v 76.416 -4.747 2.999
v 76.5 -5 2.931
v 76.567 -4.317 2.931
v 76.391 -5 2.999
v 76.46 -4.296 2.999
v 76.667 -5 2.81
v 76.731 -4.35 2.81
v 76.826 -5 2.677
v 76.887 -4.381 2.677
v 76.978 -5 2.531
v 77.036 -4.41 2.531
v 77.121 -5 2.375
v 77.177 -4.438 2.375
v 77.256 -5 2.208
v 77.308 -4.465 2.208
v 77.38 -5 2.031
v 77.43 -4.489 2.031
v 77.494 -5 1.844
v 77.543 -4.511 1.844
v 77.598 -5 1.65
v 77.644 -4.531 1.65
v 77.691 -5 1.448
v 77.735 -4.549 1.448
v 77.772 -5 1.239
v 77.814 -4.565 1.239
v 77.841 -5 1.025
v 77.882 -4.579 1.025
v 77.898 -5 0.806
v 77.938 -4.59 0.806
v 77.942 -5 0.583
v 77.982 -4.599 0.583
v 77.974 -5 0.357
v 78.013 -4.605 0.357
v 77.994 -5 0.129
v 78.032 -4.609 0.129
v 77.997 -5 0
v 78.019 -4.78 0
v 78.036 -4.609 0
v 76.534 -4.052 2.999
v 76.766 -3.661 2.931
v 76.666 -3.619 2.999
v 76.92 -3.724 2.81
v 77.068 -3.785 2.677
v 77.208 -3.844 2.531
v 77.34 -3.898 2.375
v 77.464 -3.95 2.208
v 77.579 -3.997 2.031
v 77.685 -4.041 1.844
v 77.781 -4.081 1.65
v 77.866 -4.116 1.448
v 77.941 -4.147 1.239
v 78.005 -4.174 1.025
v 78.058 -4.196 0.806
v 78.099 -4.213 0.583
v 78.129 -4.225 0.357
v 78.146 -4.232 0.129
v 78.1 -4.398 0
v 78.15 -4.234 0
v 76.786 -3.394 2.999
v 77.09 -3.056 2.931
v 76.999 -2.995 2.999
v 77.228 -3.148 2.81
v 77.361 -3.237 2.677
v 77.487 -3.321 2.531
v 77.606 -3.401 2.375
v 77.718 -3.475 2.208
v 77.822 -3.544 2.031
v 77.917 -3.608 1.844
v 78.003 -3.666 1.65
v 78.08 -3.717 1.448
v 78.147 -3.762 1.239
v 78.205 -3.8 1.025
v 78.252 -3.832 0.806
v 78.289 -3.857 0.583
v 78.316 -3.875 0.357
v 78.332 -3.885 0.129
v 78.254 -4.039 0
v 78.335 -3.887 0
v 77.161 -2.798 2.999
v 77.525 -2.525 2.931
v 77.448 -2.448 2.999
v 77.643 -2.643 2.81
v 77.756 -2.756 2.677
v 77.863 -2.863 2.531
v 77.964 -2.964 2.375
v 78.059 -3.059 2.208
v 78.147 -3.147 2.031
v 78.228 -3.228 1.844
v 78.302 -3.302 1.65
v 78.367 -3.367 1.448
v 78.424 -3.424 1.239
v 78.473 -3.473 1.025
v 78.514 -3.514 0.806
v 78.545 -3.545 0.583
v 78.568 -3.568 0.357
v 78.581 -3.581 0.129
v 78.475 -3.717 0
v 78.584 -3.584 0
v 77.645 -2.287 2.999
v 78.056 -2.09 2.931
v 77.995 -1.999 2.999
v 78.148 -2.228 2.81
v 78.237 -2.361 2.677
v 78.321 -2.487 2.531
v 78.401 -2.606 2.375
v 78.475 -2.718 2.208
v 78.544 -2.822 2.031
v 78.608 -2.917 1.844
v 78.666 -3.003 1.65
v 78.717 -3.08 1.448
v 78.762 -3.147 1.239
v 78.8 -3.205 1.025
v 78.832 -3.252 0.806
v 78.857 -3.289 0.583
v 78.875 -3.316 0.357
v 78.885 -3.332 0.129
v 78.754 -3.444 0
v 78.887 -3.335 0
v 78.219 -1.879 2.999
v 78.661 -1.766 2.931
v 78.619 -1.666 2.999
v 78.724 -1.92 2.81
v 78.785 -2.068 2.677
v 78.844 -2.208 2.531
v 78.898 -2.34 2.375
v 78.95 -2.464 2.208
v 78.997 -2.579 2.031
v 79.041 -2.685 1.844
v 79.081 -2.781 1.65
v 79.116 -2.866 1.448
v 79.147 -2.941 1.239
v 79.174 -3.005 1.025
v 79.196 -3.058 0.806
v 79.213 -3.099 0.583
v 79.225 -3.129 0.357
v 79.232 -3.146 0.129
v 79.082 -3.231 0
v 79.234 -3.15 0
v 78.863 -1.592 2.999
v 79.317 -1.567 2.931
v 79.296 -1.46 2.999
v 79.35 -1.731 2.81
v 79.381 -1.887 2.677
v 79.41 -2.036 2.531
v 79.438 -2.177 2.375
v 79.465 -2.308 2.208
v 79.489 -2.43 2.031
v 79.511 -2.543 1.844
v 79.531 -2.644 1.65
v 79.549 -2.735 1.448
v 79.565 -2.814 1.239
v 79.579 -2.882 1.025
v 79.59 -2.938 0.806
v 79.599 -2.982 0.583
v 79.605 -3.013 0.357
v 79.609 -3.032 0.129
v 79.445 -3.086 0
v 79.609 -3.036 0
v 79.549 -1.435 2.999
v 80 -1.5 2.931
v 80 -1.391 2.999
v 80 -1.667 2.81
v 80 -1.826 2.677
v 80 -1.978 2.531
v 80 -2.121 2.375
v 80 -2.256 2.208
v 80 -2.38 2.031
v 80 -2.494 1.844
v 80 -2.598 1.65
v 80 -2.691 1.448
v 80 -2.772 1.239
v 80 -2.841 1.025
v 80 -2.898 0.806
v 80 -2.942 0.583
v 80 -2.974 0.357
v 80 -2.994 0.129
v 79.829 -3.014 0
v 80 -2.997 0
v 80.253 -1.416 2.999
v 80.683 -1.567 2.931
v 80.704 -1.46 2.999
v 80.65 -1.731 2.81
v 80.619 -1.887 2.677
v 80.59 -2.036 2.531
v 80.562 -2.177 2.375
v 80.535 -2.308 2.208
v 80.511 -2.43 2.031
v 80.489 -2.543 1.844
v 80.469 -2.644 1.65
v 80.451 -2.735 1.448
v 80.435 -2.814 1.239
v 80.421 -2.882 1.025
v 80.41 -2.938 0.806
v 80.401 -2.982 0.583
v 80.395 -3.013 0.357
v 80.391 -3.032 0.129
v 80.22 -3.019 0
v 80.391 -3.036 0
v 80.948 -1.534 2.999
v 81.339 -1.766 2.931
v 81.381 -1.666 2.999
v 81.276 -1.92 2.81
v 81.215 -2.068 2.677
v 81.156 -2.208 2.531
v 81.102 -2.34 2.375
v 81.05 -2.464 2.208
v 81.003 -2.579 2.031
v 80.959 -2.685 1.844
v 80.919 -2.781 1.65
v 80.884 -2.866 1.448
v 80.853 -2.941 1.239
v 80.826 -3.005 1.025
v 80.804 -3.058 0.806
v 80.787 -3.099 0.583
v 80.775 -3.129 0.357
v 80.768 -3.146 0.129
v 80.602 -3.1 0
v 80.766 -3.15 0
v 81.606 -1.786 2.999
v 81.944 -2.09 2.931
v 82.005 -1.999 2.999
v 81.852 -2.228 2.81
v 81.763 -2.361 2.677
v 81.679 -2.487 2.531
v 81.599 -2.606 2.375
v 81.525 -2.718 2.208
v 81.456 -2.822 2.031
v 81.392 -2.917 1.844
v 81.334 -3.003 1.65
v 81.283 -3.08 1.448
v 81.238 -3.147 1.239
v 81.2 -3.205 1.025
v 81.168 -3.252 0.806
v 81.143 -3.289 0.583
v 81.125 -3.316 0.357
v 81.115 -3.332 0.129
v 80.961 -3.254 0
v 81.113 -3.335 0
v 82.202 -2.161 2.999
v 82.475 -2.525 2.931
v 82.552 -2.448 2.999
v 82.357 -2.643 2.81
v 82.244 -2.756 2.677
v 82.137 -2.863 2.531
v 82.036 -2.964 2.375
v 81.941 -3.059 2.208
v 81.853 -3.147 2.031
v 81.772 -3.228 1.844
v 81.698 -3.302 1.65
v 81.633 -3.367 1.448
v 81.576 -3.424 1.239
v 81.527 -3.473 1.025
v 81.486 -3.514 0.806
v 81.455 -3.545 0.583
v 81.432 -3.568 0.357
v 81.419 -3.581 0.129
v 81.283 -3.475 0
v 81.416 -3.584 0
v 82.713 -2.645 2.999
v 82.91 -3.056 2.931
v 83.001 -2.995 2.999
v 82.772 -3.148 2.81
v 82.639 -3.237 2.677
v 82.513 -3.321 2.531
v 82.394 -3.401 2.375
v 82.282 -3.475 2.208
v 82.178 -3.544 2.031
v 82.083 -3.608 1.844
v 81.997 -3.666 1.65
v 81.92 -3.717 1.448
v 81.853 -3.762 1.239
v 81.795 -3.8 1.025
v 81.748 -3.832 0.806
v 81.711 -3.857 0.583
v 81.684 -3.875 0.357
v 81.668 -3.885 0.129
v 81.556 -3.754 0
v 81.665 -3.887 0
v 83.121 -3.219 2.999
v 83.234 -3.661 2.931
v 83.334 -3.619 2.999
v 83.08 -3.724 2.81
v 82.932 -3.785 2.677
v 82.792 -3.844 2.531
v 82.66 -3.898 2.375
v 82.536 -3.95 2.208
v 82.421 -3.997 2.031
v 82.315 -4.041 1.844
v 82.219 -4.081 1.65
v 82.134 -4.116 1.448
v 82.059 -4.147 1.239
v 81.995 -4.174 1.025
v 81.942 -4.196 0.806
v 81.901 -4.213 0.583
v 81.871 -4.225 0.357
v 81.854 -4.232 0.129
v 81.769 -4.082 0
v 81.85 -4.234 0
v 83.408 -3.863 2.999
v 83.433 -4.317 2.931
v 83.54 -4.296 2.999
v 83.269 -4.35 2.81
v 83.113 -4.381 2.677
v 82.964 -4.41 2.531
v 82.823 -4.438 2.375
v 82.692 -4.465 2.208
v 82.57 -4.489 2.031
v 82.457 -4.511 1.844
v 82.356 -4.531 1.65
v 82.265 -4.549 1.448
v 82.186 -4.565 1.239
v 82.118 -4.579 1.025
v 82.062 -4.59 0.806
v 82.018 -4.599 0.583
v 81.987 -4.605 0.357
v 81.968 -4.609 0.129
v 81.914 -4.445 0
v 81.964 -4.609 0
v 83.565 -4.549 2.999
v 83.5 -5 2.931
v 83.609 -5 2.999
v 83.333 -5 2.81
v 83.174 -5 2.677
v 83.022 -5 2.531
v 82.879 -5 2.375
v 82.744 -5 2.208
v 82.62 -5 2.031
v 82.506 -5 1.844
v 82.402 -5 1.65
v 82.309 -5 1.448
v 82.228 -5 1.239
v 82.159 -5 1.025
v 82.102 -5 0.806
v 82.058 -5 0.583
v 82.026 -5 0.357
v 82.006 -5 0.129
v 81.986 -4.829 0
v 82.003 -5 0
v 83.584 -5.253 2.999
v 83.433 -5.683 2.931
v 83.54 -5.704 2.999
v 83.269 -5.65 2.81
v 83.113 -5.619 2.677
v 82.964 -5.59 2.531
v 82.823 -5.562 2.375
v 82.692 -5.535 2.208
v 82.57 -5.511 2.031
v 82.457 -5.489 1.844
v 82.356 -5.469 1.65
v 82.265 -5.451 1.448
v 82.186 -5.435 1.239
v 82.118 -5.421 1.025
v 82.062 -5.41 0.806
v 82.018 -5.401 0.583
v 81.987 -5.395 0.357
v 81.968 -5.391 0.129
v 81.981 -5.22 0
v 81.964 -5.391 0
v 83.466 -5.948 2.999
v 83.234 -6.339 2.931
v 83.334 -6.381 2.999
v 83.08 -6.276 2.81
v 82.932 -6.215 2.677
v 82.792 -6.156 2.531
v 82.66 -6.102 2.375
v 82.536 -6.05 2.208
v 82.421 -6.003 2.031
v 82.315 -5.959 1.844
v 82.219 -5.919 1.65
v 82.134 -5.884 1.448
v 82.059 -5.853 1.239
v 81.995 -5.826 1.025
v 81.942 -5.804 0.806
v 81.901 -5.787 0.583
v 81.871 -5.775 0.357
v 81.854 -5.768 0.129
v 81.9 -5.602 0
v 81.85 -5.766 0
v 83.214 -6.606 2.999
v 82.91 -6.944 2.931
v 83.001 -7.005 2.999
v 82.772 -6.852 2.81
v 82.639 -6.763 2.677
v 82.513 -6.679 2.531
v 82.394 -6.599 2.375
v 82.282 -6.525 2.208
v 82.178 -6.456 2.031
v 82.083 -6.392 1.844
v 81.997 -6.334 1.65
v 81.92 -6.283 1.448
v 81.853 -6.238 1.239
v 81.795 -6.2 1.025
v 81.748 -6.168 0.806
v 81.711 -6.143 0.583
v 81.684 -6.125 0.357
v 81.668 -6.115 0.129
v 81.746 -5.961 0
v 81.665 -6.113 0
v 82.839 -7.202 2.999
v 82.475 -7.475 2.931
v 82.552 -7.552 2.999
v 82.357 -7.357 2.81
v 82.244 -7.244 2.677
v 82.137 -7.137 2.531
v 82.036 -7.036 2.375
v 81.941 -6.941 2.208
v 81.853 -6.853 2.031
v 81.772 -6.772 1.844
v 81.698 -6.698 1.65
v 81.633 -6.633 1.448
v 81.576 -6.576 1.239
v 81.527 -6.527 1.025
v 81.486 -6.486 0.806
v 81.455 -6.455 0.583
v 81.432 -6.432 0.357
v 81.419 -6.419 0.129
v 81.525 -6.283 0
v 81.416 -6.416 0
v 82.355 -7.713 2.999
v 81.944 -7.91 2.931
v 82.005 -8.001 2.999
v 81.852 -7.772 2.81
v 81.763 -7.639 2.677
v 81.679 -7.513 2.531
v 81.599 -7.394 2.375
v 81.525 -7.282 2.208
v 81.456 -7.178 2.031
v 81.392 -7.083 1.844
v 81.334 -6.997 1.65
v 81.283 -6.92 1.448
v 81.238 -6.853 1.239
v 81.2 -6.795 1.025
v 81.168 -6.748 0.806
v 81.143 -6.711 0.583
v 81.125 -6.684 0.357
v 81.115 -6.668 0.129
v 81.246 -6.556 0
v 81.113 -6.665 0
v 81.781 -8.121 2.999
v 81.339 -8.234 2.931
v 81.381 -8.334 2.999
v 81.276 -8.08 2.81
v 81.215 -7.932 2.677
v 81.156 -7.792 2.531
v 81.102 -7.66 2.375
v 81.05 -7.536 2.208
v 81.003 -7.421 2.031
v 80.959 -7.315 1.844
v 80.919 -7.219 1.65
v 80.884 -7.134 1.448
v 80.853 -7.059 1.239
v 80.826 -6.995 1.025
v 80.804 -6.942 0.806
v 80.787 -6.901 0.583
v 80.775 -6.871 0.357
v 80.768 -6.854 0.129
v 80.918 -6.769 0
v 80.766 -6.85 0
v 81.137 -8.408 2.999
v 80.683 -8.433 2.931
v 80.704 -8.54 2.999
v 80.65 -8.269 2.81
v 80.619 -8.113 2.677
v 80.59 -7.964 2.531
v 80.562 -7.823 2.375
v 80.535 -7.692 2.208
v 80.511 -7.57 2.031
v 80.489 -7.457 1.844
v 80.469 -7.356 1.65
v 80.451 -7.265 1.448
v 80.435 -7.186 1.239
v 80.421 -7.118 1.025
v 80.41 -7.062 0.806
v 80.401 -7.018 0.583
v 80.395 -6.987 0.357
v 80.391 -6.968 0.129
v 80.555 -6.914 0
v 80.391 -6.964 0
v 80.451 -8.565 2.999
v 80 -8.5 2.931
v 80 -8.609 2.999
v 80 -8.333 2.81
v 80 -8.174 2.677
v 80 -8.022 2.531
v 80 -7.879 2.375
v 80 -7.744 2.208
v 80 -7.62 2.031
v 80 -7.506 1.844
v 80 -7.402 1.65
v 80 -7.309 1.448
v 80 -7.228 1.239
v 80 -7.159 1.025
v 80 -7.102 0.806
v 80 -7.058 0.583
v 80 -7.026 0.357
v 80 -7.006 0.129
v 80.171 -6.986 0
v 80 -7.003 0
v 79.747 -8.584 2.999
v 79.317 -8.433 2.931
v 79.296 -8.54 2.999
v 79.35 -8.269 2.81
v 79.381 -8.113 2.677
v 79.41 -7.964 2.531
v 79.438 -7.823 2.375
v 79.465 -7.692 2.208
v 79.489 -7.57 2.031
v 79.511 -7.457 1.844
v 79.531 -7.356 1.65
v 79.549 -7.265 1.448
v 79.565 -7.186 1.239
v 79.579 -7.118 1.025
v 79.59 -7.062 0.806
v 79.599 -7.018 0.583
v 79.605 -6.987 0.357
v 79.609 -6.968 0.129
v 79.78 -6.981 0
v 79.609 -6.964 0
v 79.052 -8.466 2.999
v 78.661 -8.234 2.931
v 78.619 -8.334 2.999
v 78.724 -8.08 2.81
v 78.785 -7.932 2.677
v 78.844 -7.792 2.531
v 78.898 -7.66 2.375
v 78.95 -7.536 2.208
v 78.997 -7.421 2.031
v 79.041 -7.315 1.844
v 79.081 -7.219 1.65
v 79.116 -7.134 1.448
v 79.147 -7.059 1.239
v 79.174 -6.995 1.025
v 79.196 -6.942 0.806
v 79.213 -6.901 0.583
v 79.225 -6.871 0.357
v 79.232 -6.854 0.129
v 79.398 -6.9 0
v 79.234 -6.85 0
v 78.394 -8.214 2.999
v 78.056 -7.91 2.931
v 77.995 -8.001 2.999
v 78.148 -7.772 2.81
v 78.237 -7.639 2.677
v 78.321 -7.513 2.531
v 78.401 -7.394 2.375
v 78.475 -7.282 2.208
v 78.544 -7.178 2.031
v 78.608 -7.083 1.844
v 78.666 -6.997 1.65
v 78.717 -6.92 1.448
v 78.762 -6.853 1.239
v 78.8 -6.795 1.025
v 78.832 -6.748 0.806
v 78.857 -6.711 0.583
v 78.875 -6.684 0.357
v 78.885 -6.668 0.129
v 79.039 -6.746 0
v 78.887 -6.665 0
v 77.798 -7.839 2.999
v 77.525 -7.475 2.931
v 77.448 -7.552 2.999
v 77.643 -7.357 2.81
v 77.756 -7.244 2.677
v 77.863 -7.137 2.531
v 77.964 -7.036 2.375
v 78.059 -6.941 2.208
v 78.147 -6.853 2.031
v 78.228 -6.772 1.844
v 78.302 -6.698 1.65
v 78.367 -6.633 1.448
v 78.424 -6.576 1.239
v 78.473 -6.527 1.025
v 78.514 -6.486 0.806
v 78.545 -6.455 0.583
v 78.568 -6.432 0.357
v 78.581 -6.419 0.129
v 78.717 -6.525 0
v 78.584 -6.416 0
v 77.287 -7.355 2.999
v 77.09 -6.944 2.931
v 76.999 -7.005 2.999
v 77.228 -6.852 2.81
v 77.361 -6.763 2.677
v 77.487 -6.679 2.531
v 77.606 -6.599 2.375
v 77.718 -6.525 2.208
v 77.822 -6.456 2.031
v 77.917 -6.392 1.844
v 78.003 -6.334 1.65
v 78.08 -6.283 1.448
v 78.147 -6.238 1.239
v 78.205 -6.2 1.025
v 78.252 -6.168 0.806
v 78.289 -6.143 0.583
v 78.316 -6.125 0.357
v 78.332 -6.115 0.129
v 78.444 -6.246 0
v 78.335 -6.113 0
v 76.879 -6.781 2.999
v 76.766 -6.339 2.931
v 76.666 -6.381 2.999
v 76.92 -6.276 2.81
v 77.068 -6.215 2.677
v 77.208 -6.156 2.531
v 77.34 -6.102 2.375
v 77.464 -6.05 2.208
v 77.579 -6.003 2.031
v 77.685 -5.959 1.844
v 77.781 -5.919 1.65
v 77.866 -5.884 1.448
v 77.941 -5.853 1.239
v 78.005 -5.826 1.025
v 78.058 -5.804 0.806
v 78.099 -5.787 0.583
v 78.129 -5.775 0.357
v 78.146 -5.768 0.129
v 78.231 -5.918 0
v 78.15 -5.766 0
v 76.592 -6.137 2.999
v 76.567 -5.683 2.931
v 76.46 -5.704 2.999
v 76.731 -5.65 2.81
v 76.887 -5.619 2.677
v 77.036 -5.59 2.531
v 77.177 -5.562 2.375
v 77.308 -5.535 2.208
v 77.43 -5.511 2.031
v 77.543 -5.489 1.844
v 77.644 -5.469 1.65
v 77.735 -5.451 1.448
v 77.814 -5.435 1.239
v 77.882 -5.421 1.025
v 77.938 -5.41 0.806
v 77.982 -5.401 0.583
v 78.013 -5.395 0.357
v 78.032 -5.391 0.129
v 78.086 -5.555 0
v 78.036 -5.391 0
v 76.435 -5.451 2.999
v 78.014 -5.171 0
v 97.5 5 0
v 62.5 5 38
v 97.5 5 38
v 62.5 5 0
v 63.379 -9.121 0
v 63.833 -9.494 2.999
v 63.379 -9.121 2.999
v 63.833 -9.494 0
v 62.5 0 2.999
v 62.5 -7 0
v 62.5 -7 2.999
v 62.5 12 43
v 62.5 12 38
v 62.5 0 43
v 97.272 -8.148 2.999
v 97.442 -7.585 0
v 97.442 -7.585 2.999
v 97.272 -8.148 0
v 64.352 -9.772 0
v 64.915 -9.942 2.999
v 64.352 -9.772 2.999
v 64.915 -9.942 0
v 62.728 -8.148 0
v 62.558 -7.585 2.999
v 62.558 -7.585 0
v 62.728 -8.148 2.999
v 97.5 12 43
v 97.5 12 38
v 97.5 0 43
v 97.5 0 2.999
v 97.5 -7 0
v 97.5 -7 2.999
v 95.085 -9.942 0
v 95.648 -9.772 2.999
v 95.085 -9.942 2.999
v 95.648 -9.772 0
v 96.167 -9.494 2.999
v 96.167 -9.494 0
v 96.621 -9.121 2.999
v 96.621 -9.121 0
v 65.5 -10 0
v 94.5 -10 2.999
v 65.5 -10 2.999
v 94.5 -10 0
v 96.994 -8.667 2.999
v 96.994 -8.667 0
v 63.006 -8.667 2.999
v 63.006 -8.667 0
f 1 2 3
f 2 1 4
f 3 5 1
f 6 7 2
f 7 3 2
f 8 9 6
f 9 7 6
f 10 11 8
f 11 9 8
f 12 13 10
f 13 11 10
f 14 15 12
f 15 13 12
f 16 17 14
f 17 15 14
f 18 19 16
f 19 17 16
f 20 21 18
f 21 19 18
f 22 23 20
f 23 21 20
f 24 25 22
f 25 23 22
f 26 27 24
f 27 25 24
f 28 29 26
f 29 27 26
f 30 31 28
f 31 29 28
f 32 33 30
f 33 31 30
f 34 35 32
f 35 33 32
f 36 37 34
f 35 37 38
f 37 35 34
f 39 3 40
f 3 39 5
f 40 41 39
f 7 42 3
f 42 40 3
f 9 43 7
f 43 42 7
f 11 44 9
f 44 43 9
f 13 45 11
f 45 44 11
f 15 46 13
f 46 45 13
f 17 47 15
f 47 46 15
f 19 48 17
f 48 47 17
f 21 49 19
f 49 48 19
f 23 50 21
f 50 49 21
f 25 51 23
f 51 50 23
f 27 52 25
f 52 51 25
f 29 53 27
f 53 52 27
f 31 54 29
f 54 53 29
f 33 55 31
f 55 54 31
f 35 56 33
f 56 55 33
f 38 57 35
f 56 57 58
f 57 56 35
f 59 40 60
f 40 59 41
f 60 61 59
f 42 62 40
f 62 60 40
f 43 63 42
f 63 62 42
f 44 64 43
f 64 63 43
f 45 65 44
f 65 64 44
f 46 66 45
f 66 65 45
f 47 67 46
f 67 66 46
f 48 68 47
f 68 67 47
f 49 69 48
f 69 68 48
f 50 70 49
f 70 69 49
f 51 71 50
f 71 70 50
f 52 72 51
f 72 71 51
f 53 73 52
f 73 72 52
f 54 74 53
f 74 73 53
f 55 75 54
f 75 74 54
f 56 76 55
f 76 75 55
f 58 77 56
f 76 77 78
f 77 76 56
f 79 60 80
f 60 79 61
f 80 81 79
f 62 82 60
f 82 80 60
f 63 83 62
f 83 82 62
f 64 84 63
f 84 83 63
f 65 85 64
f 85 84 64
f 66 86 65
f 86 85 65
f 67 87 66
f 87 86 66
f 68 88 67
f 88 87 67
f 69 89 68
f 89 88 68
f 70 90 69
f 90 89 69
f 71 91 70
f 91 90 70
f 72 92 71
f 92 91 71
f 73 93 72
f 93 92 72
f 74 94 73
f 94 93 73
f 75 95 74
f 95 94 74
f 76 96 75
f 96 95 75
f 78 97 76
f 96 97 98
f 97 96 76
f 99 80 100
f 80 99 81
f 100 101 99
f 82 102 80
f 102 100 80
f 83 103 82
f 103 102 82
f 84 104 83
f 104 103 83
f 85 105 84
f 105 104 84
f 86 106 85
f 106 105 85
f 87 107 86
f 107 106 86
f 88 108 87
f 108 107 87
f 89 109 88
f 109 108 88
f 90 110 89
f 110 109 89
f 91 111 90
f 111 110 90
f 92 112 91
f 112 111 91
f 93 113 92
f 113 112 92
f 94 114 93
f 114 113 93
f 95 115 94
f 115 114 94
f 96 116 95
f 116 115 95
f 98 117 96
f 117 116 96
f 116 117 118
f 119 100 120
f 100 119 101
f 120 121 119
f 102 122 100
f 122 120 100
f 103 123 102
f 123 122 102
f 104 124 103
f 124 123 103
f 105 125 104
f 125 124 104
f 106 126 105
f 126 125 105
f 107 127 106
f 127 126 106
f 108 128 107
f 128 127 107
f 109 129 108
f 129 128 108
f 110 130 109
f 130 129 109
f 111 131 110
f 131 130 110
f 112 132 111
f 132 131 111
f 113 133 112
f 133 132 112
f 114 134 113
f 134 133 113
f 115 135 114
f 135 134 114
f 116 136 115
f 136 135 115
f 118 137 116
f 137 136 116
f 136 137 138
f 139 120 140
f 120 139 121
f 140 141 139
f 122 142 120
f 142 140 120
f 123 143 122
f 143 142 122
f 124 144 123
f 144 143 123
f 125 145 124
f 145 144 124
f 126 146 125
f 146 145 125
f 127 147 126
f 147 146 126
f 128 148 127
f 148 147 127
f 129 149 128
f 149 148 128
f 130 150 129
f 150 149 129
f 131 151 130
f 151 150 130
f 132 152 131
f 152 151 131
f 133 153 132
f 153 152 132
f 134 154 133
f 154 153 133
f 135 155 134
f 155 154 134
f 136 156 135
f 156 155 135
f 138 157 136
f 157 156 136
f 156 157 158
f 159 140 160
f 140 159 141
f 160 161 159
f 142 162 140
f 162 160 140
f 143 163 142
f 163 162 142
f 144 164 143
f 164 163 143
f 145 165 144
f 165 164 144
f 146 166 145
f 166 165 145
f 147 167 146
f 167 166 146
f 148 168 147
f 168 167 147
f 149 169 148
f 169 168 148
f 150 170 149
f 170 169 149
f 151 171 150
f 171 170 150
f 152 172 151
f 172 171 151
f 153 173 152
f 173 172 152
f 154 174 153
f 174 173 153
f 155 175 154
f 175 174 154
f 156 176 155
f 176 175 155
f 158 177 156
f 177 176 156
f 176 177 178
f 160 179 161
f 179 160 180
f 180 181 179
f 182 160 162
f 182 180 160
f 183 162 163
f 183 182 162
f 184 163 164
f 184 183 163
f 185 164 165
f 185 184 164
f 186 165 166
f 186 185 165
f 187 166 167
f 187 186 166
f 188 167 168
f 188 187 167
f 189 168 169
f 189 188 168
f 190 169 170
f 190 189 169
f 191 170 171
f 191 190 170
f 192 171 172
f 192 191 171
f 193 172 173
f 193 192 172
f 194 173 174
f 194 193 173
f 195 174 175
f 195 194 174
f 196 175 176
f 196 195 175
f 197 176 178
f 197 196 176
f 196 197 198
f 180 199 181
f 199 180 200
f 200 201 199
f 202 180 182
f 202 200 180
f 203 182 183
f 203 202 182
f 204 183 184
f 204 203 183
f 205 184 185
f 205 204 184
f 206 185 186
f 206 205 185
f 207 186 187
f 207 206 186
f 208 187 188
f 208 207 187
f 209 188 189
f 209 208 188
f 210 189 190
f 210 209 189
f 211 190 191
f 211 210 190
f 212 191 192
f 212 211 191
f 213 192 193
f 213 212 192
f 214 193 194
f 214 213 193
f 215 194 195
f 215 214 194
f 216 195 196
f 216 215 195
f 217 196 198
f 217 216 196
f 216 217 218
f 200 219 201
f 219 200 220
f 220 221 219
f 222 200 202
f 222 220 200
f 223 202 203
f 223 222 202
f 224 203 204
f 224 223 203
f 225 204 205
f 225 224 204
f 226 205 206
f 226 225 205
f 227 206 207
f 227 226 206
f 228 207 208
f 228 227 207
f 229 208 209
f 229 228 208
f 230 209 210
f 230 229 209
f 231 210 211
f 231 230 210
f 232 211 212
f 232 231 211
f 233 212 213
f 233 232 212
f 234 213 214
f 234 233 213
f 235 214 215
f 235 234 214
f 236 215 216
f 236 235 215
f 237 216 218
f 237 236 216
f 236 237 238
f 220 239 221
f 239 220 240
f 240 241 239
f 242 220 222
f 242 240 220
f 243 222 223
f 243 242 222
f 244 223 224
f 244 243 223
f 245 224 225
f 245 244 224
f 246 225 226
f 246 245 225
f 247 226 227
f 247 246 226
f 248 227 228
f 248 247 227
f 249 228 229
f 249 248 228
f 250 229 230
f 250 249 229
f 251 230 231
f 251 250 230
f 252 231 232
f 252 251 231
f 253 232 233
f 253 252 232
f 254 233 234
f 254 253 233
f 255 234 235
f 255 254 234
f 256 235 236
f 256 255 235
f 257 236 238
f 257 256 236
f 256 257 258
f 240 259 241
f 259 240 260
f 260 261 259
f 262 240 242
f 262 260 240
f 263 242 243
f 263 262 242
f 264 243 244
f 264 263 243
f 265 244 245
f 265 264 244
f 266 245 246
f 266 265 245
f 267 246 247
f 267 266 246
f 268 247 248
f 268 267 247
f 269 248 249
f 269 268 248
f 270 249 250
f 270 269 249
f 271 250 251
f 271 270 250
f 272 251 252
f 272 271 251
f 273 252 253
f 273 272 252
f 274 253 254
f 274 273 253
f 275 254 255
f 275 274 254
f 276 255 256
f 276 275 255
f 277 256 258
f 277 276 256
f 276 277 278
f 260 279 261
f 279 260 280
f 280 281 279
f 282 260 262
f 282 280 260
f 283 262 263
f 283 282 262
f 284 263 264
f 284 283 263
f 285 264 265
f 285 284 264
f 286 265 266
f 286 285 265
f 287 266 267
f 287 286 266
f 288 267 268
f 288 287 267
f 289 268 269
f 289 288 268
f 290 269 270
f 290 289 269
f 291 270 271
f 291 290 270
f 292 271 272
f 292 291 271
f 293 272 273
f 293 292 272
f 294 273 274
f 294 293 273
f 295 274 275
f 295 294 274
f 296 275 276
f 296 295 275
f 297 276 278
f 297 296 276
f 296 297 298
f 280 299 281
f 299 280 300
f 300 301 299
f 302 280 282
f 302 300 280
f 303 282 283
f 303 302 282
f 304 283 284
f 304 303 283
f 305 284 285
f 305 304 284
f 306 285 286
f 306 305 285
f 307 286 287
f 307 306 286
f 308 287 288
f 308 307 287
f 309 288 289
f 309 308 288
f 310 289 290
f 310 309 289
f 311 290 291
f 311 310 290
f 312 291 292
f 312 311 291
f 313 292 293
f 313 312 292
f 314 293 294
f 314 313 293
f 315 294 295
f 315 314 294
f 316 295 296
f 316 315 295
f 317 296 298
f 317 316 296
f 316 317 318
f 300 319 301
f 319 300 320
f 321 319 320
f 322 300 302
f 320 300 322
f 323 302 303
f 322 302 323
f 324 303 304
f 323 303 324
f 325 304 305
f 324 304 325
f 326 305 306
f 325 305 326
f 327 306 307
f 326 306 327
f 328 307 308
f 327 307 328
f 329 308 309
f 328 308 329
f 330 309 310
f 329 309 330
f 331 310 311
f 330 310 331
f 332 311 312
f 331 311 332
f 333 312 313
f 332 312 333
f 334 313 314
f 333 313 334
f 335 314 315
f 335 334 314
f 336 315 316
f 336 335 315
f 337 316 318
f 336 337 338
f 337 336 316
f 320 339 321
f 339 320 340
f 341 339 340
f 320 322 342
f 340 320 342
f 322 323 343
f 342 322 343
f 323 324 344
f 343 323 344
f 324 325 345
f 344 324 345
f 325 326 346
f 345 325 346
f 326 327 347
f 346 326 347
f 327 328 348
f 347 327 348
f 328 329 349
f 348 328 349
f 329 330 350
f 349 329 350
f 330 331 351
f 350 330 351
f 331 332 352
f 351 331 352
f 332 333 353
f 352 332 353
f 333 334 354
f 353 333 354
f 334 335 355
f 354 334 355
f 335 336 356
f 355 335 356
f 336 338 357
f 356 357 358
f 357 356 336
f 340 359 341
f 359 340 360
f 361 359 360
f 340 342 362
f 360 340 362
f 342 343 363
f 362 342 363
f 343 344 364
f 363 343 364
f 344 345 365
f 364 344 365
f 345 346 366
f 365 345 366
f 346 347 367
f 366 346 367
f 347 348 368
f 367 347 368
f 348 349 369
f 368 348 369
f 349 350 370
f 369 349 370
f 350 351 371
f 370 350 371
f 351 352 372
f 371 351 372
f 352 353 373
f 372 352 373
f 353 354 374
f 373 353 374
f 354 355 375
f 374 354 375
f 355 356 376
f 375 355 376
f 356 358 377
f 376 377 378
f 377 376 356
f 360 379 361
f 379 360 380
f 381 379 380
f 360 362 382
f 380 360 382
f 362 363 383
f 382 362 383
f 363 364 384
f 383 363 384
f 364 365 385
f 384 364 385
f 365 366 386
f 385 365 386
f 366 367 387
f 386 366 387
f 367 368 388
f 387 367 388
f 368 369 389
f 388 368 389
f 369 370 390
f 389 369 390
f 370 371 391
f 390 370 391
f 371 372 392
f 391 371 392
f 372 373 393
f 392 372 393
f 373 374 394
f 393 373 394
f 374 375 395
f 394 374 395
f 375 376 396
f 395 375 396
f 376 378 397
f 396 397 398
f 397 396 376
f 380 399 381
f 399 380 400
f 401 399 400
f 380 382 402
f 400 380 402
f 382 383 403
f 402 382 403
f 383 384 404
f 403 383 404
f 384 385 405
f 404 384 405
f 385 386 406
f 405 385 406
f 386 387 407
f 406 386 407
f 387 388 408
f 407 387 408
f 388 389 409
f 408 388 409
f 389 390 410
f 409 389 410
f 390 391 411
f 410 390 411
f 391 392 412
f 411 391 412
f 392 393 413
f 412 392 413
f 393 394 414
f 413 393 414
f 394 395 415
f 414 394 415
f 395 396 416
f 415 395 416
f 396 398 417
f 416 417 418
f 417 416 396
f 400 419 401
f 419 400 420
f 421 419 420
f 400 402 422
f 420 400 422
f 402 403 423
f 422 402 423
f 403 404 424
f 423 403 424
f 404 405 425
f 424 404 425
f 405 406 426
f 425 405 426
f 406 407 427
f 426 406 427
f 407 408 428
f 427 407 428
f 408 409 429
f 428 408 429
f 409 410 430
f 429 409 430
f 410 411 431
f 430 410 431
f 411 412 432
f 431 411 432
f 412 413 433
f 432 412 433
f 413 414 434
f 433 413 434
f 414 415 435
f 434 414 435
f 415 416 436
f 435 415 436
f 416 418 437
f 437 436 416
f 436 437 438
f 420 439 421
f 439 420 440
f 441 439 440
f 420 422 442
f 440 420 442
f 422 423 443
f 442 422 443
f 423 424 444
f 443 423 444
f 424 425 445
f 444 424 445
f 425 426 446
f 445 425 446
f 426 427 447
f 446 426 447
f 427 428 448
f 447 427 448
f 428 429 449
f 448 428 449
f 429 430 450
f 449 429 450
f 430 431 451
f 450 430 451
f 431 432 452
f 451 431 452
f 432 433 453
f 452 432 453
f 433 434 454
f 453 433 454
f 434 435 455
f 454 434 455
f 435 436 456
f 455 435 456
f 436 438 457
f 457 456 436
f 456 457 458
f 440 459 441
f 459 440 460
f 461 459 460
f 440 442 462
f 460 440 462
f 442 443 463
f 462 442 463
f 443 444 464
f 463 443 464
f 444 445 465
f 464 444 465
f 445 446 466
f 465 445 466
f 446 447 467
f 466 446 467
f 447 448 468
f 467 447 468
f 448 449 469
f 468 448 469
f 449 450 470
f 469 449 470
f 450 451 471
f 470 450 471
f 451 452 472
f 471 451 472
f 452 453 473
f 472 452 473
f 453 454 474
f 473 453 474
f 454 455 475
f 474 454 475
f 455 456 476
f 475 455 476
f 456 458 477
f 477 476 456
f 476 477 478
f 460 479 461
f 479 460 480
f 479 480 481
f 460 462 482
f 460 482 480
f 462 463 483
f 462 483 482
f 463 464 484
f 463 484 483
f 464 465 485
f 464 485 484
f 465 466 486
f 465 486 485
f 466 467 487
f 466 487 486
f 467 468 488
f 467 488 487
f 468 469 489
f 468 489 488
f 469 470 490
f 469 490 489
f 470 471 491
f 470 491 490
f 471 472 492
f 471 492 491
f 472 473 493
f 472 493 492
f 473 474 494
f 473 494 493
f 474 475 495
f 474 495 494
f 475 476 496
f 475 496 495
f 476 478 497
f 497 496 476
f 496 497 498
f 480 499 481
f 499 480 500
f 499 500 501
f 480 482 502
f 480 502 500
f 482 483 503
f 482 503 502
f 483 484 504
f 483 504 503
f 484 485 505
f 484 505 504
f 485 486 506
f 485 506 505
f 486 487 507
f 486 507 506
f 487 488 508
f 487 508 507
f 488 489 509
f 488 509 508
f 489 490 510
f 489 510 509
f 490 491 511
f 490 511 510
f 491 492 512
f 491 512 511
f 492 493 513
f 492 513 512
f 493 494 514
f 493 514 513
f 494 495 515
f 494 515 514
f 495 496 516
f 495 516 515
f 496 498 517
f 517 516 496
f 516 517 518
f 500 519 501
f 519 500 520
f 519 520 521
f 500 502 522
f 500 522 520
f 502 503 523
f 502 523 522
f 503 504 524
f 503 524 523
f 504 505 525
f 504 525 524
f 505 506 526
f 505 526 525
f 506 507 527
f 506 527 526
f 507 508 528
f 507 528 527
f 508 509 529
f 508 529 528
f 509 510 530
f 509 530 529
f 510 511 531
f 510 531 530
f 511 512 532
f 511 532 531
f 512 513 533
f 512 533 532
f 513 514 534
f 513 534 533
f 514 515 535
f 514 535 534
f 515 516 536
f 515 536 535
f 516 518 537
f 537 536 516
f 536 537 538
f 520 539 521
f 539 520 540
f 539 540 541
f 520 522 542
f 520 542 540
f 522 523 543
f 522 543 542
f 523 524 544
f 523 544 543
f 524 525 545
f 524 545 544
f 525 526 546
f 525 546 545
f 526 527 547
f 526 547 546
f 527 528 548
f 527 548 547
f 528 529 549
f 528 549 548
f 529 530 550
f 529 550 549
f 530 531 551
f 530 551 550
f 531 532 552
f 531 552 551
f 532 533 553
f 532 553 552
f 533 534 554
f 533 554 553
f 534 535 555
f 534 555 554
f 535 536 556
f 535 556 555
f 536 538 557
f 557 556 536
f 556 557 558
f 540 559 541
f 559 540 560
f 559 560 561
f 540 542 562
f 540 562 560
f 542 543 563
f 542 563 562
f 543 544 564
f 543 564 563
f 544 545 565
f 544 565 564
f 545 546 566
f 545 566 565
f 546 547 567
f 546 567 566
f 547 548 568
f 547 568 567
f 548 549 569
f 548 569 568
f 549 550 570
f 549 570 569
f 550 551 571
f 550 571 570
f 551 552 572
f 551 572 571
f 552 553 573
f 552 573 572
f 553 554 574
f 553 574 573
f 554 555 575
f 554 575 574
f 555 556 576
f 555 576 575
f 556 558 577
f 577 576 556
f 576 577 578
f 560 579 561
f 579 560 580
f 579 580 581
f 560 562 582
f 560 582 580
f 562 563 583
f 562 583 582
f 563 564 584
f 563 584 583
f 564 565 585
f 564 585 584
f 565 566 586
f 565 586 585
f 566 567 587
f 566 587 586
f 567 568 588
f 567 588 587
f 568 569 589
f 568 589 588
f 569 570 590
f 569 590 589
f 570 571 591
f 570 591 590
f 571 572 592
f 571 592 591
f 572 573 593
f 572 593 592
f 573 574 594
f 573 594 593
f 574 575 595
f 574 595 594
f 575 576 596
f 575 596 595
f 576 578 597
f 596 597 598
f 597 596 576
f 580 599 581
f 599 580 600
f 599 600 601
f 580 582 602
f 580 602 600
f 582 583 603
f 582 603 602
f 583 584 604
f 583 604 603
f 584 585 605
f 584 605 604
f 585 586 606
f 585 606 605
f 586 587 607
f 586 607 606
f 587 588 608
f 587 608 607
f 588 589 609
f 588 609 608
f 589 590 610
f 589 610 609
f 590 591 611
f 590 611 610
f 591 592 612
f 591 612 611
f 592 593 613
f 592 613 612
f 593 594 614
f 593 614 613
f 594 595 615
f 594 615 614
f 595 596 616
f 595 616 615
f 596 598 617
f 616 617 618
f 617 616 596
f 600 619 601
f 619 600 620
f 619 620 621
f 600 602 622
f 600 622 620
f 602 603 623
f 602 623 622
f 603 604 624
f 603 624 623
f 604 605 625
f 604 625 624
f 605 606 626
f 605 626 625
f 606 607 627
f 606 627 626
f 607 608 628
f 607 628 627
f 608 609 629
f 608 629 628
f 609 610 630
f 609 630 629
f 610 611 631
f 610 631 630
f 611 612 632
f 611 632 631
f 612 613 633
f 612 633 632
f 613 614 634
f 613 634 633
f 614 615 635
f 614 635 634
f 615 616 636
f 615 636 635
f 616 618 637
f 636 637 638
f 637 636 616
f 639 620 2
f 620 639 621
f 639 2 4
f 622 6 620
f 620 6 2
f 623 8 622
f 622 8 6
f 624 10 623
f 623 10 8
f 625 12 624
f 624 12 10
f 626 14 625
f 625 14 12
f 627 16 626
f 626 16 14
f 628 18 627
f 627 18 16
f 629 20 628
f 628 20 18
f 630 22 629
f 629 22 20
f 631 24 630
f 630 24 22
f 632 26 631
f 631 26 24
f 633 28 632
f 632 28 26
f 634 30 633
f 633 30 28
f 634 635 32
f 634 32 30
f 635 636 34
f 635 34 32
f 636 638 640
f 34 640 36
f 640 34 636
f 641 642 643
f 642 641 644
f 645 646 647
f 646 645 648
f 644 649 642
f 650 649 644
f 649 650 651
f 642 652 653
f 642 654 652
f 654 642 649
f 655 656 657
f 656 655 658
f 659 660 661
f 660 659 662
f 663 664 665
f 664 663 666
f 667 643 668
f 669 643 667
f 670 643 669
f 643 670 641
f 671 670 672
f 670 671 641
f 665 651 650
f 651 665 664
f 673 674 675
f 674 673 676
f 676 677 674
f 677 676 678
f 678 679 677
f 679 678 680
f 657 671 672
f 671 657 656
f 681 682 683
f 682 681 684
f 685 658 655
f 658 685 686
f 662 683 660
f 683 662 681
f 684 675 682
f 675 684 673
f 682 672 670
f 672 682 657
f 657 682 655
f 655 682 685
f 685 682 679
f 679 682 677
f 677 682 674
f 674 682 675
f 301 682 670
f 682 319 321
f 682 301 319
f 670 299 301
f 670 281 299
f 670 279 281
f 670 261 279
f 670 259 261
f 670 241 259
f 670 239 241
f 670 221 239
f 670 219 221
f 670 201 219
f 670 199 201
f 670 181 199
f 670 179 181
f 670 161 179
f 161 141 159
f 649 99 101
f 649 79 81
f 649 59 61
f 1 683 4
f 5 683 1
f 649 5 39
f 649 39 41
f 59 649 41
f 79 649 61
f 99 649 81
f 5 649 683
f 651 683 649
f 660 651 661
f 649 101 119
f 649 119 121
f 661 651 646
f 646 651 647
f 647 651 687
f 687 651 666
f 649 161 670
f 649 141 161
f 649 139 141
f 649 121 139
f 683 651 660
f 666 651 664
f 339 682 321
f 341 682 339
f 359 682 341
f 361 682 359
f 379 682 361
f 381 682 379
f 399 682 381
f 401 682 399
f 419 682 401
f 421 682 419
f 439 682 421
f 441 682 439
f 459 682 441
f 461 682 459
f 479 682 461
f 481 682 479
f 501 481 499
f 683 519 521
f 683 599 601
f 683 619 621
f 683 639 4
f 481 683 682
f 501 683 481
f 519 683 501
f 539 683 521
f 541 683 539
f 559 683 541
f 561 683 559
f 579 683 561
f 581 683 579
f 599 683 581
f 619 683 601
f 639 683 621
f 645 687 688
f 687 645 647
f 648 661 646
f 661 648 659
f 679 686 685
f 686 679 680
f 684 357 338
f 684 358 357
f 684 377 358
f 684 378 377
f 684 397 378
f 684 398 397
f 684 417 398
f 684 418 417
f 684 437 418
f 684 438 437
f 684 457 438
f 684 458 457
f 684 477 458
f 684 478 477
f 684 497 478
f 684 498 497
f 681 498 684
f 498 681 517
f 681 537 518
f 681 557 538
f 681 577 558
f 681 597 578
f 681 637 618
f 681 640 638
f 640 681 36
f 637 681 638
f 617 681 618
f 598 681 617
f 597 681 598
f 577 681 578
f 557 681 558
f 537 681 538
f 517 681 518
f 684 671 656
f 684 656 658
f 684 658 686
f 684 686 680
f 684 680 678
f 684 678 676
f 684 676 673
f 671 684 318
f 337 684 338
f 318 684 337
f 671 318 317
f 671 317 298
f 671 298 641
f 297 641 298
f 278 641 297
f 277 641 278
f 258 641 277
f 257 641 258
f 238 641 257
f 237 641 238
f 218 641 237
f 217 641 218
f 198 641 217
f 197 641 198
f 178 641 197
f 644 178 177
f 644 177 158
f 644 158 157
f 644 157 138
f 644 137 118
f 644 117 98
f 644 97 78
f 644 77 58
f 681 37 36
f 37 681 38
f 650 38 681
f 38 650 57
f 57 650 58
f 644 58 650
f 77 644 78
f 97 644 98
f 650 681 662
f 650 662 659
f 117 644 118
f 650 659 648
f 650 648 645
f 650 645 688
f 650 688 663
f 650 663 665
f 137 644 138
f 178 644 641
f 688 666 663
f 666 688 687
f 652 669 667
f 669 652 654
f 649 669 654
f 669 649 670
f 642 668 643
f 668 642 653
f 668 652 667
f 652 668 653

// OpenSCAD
// file: lib/triangle.scad
module triangle(o_len=5, a_len=5, depth=1)
{
    linear_extrude(height=depth) {
        polygon(points=[[0,0],[a_len,0],[0,o_len]], paths=[[0,1,2]]);
    }
}
module aligned_triangle(o_len=5, a_len=5, depth=1)
{
    linear_extrude(height=depth) {
        translate([-o_len/2,-a_len/2,0])
            polygon(points=[[0,0],[a_len,0],[0,o_len]], paths=[[0,1,2]]);
    }
}
// file: lib/cylinder.scad
module cylinder_flange_sphere($fn=32,r1=10, r2=15, h=5)
{
    diff=abs(r1-r2);
    h_off= (r1 < r2 ) ? 0 : diff;


    difference()
    {
        cylinder($fn=$fn, r=max(r2,r1),h=h);
        scale([1,1,h/diff])
        rotate_extrude()
            translate([diff+min(r2,r1),h_off])
                rotate([0,0,0])
                    circle($fn=$fn*diff,r=diff);
    }
}
cylinder_flange_sphere($fn=32,r1=4, r2=17.5, h=7);
color([0.5,0.1,0,0.2]) %cylinder(r=17.5,h=20);
translate([0,0,-4]) color([0.0,0.1,0.4,0.2]) %cylinder(r=4,h=25);


translate([40,0])
{
    cylinder_flange_sphere($fn=32,r1=17.5, r2=4, h=7);
    color([0.5,0.1,0,0.2]) %cylinder(r=17.5,h=20);
    translate([0,0,-4]) color([0.0,0.1,0.4,0.2]) %cylinder(r=4,h=25);
}
// file: lib/cube.scad
module aligned_cube(size, aligned=[1,1,0])
{
    translate(-0.5*[size[0]*aligned[0], size[1]*aligned[1], size[2]*aligned[2]])
        cube(size);
}
module aligned_rounded_cube(size, r=5, rounding=[1,1,1], aligned=[1,1,0])
{

    translate(-0.5*[ ( size[0]*aligned[0] -2*r),
                     ( size[1]*aligned[1] -2*r),
                     ( size[2]*aligned[2] -2*r)])
    {

        _eps=min([size[0]/2,size[1]/2,size[2]/2, 0.001]);
        if( rounding == [1,1,1] ) {
            if(r>=min(size)) {
                echo("warning r is smaller than thickness for aligned cube");
            }
            minkowski() {
                cube([size[0] - 2*r, size[1] - 2*r, size[2]- 2*r]);
                sphere(r);
            }
        }else if( rounding == [1,1,0] ) {
            //cylinder rounding x/y
            if(r*2>=size[0] || r*2>=size[1] ) {
                echo("warning r is smaller than thickness for aligned cube");
            }
            minkowski() {
                translate([ 0,0,-r])
                    cube([size[0] - 2*r, size[1] - 2*r, size[2]-2*_eps]);
                cylinder(r=r,h=_eps);
            }
        }else if( rounding == [1,0,1] ) {
            //cylinder rounding x/z
            if(r*2>=size[0] || r*2>=size[2] ) {
                echo("warning r is smaller than thickness for aligned cube");
            }
            minkowski() {
                translate([ 0,-r,0])
                    cube([size[0] - 2*r, size[1] - 2*_eps, size[2]- 2*r]);
                rotate([90,0]) {
                    cylinder(r=r,h=_eps);
                }
            }
        }else if( rounding == [0,1,1] ) {
            //cylinder rounding x/z
            if(r*2>=size[1] || r*2>=size[2] ) {
                echo("warning r is smaller than thickness for aligned cube");
            }
            minkowski() {
                translate([-r,0,0])
                    cube([size[0] - 2*_eps , size[1] - 2*r, size[2]- 2*r]);
                rotate([0,90]) {
                    cylinder(r=r,h=_eps);
                }
            }
        }
    }
}


module rounded_cube(size, r, rounding=[0,0,0])
{
    aligned_rounded_cube(size, r, rounding=[0,0,0], aligned=[0,0,0]);
}



module axis(l=30, w=0.3) {
    color("red")
        cube([l,w,w]);
    color("lightblue")
        cube([w,w,l]);
    color("lightgreen")
        cube([w,l,w]);
    color("black")
        cube([w,w,w]);
}

module cylinder_square(size,d,aligned) {
    r=d/2;
    
    // front
    translate([-1*aligned[0]*(size[0]/2),-1*aligned[1]*(size[1]/2),-1*aligned[2]*d/4])
    translate([size[0]/2,size[1]/2,d/4])
    for (x=[1,-1]){
        hull() {
            translate([size[0]/2,x*size[1]/2,0])
            sphere(d=d);
            translate([-1*(size[0]/2),x*size[1]/2,0])
            sphere(d=d);
        }
        hull() {
            translate([x*size[0]/2,size[1]/2,0])
            sphere(d=d);
            translate([x*size[0]/2,-1*size[1]/2,0])
            sphere(d=d);
        }
    }
}
module cubic_flange($fn, size, e, aligned)
{
    h_off= (e < 0 ) ? 0 : size[2];

    difference()
    {
        aligned_cube(size=[size[0],size[1],size[2]], aligned=aligned);
        
        echo(e);
        echo(size[2]);
        translate([0,0,size[0]/2])
        scale([1,1,size[0]/e])
        cylinder_square($fn=$fn,size=[size[0],size[1]], d=e*2, aligned=aligned);
        //minkowski()
        
    }
}
// test show
$fn=32;
e=3;

translate([-45,45,0]) {
    
    translate([50,-90,0]) {
        axis();
        translate([0,0,10])
        %aligned_cube([10-2*e,10-2*e,5]);
        translate([0,0,-5])
        %aligned_cube([10,10,5]);

        cubic_flange($fn=32,size=[10,10,10], e=e, aligned=[1,1,0]); 
        translate([0,-10,0])
        text(halign="center",valign="center", size=2, "cubic_flange()");
    
    }

    translate([0,-90,0]) {
        axis();

        cube(size=[10,10,10]);
        translate([0,-10,0])
        text(halign="center",valign="center", size=2, "cube()");
    }

    translate([0,10,0]) {
        axis();

        aligned_cube(size=[10,10,10], aligned=[1,1,1]);
        translate([0,-10,0])
        text(halign="center",valign="center",  size=2, "aligned_cube([1,1,1])");
    }

    translate([0,-30,0]) {
        axis();

        aligned_rounded_cube(size=[10,10,10],r=1, aligned=[1,1,0]);
        translate([0,-10,0])
        text(halign="center",valign="center", size=2, "aligned_rounded_cube([1,1,0])");
    }

    translate([50,10,0]) {
        $fn=32;
        axis();

        aligned_rounded_cube(size=[10,10,10],r=1, aligned=[1,1,0]);
        translate([0,-10,0])
        text(halign="center",valign="center",  size=2, "aligned_rounded_cube(r=1)");
    }

    translate([50,-30,0]) {
        $fn=32;
        axis();

        aligned_rounded_cube(size=[10,10,10],r=2, aligned=[1,1,0]);
        translate([0,-10,0])
        text(halign="center",valign="center", size=2, "aligned_rounded_cube(r=2)");
    }

    translate([100,10,0]) {
        $fn=32;
        axis();

        aligned_rounded_cube(size=[10,10,10],r=2, rounding=[1,1,1]);
        translate([0,-10,0])
        text(halign="center",valign="center",  size=2, "aligned_rounded_cube([1,1,1])");
    }
    translate([100,-30,0]) {
        $fn=32;
        axis();

        aligned_rounded_cube(size=[10,10,10],r=2, rounding=[1,1,0]);
        translate([0,-10,0])
        text(halign="center",valign="center", size=2, "aligned_rounded_cube([1,1,0])");
    }
    translate([100,-60,0]) {
        $fn=32;
        axis();

        aligned_rounded_cube(size=[10,10,10],r=2, rounding=[1,0,1]);
        translate([0,-10,0])
        text(halign="center",valign="center",  size=2, "aligned_rounded_cube([1,0,1])");
    }
    translate([100,-90,0]) {
        $fn=32;
        axis();

        aligned_rounded_cube(size=[10,10,10],r=2, rounding=[0,1,1]);
        translate([0,-10,0])
        text(halign="center",valign="center", size=2, "aligned_rounded_cube([0,1,1])");
    }
}
// main file
use <lib/cube.scad>;
use <lib/cylinder.scad>;
use <lib/triangle.scad>;

w=5;
h_transformer=30+8;
l=25;
$e=0.1;


translate([-80,0,0])
    %mount();
translate([  0,0,0])
   %mount_2();
translate([+80,0,0])
    mount_3();

module mount()
{
    cube(size=[l,w,h_transformer+w]);
    cube(size=[w,l,h_transformer+w]);

    cube(size=[l,w,h_transformer]);



    difference() {
        w2=10;
        union() {
            translate([-w,-w2,0])
            aligned_rounded_cube([l+w,w+w2,3], 3, [1,1,0], [0,0,0]);
            translate([-w2,-w2,0])
            aligned_rounded_cube([w+w2,l+w2,3], 3, [1,1,0], [0,0,0]);
        }

        d=4;

        translate([-w2/2,l/2,-$e])
        cylinder_flange_sphere($fn=32, r1=d/2, r2=5, h=3.5);
        translate([l/2,-w2/2,-$e])
        cylinder_flange_sphere($fn=32, r1=d/2, r2=5, h=3.5);
    }

    translate([w,w,h_transformer])
    triangle(l-w,l-w,w);

    translate([w,w,0])
    %cube(size=[l*2,l*2,h_transformer]);
}
module mount_2()
{
    translate([-l-w/2,0])
    cube(size=[l+l+w,w,h_transformer+w]);
    translate([-w/2,0])
    cube(size=[w,l,h_transformer+w]);

    cube(size=[l,w,h_transformer]);

    difference() {
        w2=10;
        union() {
            translate([-l-w/2,-w2,0])
            aligned_rounded_cube([l+l+w,w+w2,3], 3, [1,1,0], [0,0,0]);
        }

        d=4;

        translate([l/2,-w2/2,-$e])
        cylinder_flange_sphere($fn=32, r1=d/2, r2=5, h=3.5);
        translate([-l/2,-w2/2,-$e])
        cylinder_flange_sphere($fn=32, r1=d/2, r2=5, h=3.5);
    }

    translate([w/2,w,h_transformer])
    triangle(l-w,l-w,w);

    rotate([0,0,90])
    translate([w,w/2,h_transformer])
    triangle(l-w,l-w,w);

    translate([w,w,0])
    %cube(size=[l*2,l*2,h_transformer]);
}

module mount_3(holes)
{
    l=l*0.7;
    translate([-l,0])
    cube(size=[l+l,w,h_transformer+w]);

    difference() {
        w2=10;
        union() {
            translate([-l,-w2,0])
            aligned_rounded_cube([l+l,w+w2,3], 3, [1,1,0], [0,0,0]);
        }

        d=4;

        if(holes==2) {
            translate([l/2,-w2/2,-$e])
            cylinder_flange_sphere($fn=32, r1=d/2, r2=5, h=3.5);
            translate([-l/2,-w2/2,-$e])
            cylinder_flange_sphere($fn=32, r1=d/2, r2=5, h=3.5);
        }else {
            
            translate([0,-w2/2,-$e])
            cylinder_flange_sphere($fn=32, r1=d/2, r2=5, h=3.5);
        }
    }

    translate([-l,w,h_transformer])
    cube([2*l,7,w]);

    translate([-l,w,0])
    %cube(size=[l*2,l*2,h_transformer]);
}

module plate() {
    difference() {
        cylinder($fn=128,d=86,h=1);

        translate([0,0,-$e])
        cylinder(d=4,h=1+2*$e);

        translate([30,0,-$e])
        cylinder(d=8,h=1+2*$e);
    }
}
